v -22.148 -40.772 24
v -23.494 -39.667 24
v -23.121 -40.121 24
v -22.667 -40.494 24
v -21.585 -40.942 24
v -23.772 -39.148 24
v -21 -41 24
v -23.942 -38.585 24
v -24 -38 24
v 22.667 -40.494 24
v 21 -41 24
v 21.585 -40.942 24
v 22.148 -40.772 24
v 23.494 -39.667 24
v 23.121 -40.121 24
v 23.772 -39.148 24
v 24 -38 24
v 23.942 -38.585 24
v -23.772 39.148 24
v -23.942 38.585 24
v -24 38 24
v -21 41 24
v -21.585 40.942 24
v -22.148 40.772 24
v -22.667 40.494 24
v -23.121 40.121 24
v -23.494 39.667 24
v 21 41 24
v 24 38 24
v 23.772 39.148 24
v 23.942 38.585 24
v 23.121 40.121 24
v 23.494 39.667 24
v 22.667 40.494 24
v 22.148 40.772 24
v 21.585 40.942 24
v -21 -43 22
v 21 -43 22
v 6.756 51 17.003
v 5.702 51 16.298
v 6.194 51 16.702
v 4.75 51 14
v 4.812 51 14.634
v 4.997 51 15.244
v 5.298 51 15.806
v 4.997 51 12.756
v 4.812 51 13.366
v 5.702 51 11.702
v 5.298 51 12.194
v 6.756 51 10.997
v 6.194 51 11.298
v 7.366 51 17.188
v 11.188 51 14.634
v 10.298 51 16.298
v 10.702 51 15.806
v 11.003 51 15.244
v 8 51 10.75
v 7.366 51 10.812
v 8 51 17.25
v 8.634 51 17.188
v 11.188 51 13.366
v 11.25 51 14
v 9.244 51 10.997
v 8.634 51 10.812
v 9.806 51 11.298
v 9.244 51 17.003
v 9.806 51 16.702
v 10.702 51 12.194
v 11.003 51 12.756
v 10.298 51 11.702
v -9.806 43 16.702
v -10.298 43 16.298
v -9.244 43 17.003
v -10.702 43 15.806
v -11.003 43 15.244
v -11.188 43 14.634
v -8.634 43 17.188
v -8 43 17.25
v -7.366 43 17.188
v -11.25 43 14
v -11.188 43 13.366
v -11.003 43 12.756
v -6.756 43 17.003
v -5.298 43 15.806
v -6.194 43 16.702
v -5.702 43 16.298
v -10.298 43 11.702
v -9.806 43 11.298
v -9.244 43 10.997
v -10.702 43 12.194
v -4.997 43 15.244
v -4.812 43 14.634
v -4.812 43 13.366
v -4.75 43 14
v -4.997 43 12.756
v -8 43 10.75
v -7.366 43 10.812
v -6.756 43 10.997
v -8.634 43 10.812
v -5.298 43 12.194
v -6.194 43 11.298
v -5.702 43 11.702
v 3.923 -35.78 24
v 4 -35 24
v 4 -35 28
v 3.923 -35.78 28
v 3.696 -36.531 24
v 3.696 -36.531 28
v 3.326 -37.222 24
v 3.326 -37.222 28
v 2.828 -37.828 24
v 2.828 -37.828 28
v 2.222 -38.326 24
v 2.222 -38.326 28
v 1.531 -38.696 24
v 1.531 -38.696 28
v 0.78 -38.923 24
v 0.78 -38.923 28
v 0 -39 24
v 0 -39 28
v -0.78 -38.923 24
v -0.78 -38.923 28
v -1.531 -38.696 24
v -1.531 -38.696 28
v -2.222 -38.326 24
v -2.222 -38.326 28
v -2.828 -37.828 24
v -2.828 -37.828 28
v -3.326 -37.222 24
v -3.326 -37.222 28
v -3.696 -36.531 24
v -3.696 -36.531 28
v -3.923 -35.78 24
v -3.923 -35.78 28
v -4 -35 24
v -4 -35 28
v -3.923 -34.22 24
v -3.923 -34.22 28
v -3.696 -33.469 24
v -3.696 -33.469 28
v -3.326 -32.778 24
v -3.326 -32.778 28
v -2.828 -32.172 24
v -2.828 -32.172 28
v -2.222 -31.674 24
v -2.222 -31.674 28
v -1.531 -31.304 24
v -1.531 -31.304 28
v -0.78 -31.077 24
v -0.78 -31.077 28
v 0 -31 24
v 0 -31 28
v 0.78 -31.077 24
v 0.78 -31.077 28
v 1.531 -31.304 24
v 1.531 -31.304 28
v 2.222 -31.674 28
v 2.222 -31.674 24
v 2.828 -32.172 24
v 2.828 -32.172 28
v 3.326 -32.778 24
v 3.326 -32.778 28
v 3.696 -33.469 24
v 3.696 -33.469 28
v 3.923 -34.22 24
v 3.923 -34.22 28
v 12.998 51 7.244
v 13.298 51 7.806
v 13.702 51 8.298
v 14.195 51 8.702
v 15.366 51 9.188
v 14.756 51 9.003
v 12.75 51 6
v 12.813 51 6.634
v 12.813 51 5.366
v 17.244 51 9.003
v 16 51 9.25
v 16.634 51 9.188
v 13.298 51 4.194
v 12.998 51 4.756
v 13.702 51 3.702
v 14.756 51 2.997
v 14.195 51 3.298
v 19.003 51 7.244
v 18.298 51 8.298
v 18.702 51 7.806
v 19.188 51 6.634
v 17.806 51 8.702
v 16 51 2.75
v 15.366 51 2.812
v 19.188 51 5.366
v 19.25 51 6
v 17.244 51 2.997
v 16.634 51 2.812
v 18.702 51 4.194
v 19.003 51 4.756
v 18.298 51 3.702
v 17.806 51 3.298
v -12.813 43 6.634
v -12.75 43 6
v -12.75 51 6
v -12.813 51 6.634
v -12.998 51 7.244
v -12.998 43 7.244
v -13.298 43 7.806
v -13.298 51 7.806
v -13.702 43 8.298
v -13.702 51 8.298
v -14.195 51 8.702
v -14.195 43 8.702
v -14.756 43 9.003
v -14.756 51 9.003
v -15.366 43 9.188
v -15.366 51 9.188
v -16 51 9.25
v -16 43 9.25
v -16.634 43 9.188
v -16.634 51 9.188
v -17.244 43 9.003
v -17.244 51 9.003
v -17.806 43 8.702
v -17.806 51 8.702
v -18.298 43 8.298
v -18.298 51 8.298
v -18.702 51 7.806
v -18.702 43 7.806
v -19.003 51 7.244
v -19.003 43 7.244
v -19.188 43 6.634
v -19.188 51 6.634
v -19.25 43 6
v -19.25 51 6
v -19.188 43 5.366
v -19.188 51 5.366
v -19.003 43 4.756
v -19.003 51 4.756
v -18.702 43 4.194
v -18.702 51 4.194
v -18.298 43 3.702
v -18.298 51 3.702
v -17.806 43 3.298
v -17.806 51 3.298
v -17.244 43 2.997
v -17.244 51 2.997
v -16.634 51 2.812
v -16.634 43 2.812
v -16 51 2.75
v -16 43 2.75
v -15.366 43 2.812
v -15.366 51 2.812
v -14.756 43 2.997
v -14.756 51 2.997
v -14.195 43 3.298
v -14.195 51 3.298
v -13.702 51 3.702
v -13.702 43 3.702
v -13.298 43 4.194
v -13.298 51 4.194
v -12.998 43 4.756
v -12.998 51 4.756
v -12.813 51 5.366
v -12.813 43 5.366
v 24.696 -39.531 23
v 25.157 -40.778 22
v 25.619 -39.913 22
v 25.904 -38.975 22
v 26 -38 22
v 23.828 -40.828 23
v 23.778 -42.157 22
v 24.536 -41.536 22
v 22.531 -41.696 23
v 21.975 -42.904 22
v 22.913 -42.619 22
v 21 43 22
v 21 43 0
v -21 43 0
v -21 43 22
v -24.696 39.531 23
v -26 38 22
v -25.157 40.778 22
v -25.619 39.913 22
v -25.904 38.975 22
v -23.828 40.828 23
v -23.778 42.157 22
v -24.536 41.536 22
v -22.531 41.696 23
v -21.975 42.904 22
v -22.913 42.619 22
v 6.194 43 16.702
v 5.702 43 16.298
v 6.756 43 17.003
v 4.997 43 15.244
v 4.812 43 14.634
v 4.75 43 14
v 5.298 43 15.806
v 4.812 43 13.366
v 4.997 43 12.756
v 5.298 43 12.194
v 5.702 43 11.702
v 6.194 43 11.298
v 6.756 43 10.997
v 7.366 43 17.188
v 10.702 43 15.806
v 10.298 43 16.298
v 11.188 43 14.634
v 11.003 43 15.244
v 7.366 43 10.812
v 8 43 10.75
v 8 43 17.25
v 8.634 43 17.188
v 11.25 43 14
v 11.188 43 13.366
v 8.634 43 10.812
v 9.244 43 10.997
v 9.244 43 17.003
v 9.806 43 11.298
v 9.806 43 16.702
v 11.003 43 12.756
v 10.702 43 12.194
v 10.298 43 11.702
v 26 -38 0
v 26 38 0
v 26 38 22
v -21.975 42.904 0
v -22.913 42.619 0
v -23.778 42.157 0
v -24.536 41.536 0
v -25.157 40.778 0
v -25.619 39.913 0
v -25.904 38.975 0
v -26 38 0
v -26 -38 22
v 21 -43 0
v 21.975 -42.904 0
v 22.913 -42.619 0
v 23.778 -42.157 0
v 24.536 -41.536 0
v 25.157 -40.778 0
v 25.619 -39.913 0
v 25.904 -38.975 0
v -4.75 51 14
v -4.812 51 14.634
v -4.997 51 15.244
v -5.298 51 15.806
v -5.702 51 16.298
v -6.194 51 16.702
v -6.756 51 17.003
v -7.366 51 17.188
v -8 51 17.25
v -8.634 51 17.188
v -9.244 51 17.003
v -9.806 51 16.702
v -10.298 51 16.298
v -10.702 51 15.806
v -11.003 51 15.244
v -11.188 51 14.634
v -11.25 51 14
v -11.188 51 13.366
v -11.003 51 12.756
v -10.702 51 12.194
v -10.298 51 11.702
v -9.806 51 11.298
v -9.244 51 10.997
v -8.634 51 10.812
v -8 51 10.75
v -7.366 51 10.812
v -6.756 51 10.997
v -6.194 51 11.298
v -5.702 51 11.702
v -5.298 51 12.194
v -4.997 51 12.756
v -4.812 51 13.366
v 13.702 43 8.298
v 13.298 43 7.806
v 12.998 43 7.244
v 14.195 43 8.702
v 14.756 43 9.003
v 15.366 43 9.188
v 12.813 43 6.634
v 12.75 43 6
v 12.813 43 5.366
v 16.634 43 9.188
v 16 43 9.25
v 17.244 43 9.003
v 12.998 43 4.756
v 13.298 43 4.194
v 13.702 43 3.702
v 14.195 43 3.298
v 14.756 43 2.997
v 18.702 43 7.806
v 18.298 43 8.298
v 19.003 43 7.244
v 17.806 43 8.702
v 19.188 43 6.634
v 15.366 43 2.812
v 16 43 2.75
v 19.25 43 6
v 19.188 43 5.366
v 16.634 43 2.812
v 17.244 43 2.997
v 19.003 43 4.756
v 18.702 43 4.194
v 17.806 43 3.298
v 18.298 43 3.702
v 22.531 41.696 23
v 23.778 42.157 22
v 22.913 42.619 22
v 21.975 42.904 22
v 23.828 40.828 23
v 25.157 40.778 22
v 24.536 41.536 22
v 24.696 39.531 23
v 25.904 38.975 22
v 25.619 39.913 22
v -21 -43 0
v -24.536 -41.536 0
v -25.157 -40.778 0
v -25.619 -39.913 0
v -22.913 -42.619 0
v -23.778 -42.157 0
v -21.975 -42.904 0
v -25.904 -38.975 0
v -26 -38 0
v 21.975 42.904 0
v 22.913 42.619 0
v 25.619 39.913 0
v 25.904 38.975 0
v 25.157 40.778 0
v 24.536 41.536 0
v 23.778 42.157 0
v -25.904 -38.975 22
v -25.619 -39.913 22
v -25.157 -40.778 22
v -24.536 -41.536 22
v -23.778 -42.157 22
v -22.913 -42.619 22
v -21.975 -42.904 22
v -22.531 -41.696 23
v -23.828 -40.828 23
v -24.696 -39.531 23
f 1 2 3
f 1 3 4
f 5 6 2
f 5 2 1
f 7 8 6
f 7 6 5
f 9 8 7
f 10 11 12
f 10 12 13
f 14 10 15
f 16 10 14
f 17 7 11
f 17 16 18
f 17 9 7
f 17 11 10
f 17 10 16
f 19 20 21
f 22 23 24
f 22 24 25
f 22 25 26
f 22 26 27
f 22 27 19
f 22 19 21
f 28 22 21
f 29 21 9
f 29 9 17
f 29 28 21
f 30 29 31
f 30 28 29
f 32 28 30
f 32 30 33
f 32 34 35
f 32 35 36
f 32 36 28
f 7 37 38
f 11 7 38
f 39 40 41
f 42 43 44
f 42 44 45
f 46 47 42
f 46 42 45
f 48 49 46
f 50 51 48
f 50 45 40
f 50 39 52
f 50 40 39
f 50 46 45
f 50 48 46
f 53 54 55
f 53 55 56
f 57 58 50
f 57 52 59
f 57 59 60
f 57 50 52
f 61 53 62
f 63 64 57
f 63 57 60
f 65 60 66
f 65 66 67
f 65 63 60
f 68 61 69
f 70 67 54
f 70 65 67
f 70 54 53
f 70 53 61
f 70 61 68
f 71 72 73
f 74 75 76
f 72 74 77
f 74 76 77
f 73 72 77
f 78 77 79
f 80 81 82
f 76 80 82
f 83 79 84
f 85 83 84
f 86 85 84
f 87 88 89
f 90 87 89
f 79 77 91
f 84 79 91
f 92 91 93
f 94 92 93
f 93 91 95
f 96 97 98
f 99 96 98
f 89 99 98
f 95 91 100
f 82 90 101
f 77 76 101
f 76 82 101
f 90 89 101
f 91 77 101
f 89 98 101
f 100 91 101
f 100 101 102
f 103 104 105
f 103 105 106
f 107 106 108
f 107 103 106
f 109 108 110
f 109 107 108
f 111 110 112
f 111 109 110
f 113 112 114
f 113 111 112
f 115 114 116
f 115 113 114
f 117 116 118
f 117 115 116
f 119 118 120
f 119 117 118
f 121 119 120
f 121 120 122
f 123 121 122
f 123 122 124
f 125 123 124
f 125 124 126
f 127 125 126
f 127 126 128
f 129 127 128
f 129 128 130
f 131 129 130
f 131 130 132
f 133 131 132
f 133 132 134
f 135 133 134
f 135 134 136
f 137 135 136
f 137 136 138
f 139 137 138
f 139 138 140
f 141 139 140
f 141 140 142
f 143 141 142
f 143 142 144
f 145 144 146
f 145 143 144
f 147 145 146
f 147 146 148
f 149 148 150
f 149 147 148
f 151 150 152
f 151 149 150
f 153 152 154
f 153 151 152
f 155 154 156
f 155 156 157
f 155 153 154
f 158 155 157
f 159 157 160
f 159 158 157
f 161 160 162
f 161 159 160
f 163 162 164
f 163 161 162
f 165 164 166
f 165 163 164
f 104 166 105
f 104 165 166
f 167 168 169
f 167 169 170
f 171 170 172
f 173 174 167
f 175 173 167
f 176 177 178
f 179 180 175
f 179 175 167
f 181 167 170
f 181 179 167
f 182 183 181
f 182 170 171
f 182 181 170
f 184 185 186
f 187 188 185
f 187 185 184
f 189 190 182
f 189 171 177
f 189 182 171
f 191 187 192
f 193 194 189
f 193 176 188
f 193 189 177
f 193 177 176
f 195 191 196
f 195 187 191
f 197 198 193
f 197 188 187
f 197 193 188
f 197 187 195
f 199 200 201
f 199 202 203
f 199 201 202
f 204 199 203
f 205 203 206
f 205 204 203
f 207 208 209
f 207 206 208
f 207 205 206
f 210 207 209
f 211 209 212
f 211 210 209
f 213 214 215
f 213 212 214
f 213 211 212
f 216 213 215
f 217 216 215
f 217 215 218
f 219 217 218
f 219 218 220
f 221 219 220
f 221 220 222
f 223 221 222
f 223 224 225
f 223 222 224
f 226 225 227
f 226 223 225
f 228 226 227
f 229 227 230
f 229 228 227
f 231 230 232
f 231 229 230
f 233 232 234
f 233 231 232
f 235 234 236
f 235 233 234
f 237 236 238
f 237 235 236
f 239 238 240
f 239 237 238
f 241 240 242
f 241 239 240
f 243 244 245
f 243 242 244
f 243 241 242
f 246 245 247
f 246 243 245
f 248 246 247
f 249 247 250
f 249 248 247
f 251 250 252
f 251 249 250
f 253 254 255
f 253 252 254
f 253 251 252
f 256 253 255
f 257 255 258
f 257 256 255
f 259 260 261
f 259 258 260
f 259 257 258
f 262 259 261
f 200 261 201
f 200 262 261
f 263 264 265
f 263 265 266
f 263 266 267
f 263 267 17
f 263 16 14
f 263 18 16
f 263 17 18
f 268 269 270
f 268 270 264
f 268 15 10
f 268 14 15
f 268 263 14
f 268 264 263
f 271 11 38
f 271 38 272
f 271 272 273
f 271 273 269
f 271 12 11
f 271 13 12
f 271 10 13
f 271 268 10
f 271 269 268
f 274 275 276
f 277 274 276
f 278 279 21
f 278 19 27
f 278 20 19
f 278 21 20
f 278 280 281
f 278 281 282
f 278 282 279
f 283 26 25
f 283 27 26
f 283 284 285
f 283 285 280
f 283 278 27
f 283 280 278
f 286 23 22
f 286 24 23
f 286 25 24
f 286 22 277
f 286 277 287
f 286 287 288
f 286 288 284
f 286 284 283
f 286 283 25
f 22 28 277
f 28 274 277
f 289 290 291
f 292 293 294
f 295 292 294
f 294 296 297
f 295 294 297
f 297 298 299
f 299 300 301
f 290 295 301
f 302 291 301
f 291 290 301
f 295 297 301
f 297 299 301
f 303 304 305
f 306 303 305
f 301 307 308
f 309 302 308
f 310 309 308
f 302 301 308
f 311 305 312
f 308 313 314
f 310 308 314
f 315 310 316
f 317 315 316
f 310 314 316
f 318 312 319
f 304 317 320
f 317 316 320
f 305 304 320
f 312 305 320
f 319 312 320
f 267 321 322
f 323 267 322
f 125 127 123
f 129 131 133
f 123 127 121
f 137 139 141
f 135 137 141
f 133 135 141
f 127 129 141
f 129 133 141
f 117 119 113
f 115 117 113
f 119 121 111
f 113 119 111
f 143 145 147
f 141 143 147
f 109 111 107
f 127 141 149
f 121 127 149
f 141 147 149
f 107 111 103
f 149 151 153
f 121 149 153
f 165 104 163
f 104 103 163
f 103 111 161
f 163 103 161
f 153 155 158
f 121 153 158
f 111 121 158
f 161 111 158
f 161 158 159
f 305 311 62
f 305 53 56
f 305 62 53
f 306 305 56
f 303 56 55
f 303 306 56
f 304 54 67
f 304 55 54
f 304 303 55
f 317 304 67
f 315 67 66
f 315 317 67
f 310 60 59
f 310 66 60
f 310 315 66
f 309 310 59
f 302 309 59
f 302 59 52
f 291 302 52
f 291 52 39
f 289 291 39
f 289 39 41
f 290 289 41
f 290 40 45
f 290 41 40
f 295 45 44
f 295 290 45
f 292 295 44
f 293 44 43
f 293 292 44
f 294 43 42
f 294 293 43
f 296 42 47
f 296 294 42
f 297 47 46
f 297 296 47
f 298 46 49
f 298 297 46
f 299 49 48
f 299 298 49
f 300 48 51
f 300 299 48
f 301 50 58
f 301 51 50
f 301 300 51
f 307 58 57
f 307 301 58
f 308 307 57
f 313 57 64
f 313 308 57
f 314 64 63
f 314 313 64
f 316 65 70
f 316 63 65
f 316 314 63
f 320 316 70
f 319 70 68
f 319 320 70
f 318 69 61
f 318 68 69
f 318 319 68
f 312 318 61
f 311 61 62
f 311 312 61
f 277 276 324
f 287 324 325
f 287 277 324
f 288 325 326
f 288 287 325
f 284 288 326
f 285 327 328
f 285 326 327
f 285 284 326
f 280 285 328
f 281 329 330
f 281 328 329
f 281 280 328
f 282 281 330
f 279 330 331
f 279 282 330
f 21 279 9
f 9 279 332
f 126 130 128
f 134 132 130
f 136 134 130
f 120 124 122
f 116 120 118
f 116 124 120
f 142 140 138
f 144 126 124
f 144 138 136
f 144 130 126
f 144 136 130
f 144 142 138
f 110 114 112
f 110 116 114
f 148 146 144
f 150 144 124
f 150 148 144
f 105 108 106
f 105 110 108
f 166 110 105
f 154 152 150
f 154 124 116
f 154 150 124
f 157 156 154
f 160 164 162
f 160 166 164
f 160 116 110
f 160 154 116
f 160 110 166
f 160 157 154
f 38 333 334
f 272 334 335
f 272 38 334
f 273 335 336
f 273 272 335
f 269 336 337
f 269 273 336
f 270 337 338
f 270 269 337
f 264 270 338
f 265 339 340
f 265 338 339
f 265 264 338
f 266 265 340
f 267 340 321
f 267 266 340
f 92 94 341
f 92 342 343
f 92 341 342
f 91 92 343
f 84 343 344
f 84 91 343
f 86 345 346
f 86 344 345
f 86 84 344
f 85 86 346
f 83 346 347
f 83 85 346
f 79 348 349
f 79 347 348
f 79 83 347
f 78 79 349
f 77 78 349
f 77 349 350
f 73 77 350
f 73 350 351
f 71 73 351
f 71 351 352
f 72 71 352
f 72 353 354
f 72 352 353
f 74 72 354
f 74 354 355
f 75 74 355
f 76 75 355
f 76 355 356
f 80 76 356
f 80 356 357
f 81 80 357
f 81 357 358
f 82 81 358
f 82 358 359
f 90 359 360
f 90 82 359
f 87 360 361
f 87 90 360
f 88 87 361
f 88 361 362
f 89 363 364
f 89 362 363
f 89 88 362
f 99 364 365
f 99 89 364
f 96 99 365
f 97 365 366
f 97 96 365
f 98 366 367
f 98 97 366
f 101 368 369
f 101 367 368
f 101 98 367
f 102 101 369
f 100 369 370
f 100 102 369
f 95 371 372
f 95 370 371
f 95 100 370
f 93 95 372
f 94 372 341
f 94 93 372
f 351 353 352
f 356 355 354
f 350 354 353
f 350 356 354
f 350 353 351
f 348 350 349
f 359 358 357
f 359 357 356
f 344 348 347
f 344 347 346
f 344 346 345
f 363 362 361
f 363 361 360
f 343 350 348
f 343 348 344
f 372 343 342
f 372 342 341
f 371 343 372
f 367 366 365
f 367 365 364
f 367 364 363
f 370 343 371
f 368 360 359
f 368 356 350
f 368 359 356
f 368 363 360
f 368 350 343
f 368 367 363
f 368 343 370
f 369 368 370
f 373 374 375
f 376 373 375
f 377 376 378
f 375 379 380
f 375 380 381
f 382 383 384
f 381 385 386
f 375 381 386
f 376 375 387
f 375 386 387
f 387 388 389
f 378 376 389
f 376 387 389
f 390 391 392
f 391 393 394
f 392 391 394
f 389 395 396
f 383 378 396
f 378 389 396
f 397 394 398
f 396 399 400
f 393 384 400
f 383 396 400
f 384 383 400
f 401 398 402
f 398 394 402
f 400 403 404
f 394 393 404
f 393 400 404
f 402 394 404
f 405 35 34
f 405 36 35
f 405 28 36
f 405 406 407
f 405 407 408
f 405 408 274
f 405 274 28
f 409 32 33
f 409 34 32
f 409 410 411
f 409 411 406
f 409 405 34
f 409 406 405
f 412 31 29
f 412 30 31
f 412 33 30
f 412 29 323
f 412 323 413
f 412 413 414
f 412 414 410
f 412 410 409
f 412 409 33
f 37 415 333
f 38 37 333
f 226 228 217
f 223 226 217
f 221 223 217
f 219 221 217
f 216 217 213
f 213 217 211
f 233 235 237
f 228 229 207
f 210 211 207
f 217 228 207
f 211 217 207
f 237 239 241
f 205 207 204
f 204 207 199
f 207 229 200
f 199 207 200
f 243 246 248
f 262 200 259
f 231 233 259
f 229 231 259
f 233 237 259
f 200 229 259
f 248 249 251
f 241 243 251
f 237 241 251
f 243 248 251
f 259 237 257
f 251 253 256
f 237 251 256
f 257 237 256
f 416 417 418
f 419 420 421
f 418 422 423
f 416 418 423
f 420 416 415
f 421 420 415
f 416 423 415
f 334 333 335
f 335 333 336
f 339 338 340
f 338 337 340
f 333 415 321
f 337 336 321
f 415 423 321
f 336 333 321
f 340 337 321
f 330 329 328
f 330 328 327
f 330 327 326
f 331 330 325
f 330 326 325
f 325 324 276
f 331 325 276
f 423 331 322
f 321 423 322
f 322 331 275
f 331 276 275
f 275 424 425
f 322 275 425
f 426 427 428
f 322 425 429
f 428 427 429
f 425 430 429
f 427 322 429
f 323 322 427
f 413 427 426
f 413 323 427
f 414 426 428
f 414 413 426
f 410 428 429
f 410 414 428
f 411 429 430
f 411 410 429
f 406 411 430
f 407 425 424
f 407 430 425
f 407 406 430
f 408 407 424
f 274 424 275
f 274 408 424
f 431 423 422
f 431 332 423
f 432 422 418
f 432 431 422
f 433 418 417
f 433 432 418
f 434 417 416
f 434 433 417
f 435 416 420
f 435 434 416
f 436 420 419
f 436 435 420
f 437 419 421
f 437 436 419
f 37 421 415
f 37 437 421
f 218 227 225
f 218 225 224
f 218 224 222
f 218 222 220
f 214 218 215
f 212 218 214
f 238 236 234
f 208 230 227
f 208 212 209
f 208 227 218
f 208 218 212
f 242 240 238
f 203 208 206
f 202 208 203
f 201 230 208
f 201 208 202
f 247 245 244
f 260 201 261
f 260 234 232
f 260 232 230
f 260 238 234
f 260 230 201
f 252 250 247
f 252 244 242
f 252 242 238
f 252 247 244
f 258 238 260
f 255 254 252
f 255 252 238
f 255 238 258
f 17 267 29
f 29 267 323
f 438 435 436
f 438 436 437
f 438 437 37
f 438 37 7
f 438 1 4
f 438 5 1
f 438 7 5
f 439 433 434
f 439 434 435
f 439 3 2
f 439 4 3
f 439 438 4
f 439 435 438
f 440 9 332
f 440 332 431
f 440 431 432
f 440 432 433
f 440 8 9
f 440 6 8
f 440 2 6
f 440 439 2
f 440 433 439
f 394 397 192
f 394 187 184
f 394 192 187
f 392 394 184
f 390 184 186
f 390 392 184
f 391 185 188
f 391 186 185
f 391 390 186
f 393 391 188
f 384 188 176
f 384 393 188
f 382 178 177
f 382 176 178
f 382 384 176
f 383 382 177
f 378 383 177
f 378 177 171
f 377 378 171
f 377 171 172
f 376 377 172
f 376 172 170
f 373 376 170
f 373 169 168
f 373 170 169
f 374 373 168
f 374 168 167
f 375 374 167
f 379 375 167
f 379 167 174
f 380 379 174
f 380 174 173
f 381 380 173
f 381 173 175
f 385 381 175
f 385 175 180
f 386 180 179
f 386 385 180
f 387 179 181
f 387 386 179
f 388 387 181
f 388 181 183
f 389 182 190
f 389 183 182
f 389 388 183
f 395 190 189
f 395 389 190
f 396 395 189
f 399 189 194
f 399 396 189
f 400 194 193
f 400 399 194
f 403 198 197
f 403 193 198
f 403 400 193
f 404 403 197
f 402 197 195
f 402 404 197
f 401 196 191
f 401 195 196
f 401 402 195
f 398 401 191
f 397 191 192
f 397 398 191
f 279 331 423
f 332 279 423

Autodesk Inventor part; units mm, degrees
ref_plane "YZ Plane" through (0, 0, 0) normal (1, 0, 0) x (0, 1, 0)
ref_plane "XZ Plane" through (0, 0, 0) normal (0, 1, 0) x (-1, 0, 0)
ref_plane "XY Plane" through (0, 0, 0) normal (0, 0, 1) x (1, 0, 0)
sketch "Sketch1" plane through (0, 0, 0) normal (0, 0, 1) x (1, 0, 0)
  line L0 (-26, -43) -> (26, -43)
  line L1 (26, -43) -> (26, 43)
  line L2 (26, 43) -> (-26, 43)
  line L3 (-26, 43) -> (-26, -43)
  line L4 (-26, -43) -> (26, 43) construction
  line L5 (26, -43) -> (-26, 43) construction
  point P0 (0, 0)
  dimension "d0" = 52
  dimension "d1" = 86
extrude "Extrusion1" add sketch "Sketch1" along normal blind 24
sketch "Sketch2" plane through (-26, 43, 0) normal (0, 1, 0) x (1, 0, 0)
  circle A0 centre (34, -14) radius 3.25
  circle A1 centre (42.0002, -6) radius 3.25
  line L0 (52, 0) -> (0, 0) projected
  line L1 (52, -24) -> (0, -24) projected
  line L2 (26, 4.8) -> (26, -28.8) projected
  circle A2 centre (18, -14) radius 3.25
  circle A3 centre (9.9998, -6) radius 3.25
  point P0 (26, 0)
  dimension "d4" = 6.5
  dimension "d5" = 6.5
  dimension "d6" = 6
  dimension "d7" = 10
  dimension "d8" = 8
  dimension "d9" = 16.0002
extrude "Extrusion2" add sketch "Sketch2" along normal blind 8 separate body
sketch "Sketch3" plane through (0, 0, 24) normal (0, 0, 1) x (1, 0, 0)
  line L0 (0, 69.8) -> (0, -61.8) projected
  circle A0 centre (0, -35) radius 4
  line L1 (-26, -43) -> (26, -43) projected
  point P0 (0, 0)
  dimension "d12" = 8
  dimension "d13" = 8
extrude "Extrusion3" add sketch "Sketch3" along normal blind 4 separate body
fillet "Fillet1" radius 5 4 edges at (26, -43, 12) (-26, -43, 12) (26, 43, 12) (-26, 43, 12)
chamfer "Chamfer1" distance 2 angle 45 8 edges at (26, 0, 24) (24.5355, 41.5355, 24) (0, 43, 24) (-24.5355, 41.5355, 24) (-26, 0, 24) (-24.5355, -41.5355, 24) (0, -43, 24) (24.5355, -41.5355, 24)
equation "\"d5\" = d4"
properties part number "SatLab UAV_RTK"
